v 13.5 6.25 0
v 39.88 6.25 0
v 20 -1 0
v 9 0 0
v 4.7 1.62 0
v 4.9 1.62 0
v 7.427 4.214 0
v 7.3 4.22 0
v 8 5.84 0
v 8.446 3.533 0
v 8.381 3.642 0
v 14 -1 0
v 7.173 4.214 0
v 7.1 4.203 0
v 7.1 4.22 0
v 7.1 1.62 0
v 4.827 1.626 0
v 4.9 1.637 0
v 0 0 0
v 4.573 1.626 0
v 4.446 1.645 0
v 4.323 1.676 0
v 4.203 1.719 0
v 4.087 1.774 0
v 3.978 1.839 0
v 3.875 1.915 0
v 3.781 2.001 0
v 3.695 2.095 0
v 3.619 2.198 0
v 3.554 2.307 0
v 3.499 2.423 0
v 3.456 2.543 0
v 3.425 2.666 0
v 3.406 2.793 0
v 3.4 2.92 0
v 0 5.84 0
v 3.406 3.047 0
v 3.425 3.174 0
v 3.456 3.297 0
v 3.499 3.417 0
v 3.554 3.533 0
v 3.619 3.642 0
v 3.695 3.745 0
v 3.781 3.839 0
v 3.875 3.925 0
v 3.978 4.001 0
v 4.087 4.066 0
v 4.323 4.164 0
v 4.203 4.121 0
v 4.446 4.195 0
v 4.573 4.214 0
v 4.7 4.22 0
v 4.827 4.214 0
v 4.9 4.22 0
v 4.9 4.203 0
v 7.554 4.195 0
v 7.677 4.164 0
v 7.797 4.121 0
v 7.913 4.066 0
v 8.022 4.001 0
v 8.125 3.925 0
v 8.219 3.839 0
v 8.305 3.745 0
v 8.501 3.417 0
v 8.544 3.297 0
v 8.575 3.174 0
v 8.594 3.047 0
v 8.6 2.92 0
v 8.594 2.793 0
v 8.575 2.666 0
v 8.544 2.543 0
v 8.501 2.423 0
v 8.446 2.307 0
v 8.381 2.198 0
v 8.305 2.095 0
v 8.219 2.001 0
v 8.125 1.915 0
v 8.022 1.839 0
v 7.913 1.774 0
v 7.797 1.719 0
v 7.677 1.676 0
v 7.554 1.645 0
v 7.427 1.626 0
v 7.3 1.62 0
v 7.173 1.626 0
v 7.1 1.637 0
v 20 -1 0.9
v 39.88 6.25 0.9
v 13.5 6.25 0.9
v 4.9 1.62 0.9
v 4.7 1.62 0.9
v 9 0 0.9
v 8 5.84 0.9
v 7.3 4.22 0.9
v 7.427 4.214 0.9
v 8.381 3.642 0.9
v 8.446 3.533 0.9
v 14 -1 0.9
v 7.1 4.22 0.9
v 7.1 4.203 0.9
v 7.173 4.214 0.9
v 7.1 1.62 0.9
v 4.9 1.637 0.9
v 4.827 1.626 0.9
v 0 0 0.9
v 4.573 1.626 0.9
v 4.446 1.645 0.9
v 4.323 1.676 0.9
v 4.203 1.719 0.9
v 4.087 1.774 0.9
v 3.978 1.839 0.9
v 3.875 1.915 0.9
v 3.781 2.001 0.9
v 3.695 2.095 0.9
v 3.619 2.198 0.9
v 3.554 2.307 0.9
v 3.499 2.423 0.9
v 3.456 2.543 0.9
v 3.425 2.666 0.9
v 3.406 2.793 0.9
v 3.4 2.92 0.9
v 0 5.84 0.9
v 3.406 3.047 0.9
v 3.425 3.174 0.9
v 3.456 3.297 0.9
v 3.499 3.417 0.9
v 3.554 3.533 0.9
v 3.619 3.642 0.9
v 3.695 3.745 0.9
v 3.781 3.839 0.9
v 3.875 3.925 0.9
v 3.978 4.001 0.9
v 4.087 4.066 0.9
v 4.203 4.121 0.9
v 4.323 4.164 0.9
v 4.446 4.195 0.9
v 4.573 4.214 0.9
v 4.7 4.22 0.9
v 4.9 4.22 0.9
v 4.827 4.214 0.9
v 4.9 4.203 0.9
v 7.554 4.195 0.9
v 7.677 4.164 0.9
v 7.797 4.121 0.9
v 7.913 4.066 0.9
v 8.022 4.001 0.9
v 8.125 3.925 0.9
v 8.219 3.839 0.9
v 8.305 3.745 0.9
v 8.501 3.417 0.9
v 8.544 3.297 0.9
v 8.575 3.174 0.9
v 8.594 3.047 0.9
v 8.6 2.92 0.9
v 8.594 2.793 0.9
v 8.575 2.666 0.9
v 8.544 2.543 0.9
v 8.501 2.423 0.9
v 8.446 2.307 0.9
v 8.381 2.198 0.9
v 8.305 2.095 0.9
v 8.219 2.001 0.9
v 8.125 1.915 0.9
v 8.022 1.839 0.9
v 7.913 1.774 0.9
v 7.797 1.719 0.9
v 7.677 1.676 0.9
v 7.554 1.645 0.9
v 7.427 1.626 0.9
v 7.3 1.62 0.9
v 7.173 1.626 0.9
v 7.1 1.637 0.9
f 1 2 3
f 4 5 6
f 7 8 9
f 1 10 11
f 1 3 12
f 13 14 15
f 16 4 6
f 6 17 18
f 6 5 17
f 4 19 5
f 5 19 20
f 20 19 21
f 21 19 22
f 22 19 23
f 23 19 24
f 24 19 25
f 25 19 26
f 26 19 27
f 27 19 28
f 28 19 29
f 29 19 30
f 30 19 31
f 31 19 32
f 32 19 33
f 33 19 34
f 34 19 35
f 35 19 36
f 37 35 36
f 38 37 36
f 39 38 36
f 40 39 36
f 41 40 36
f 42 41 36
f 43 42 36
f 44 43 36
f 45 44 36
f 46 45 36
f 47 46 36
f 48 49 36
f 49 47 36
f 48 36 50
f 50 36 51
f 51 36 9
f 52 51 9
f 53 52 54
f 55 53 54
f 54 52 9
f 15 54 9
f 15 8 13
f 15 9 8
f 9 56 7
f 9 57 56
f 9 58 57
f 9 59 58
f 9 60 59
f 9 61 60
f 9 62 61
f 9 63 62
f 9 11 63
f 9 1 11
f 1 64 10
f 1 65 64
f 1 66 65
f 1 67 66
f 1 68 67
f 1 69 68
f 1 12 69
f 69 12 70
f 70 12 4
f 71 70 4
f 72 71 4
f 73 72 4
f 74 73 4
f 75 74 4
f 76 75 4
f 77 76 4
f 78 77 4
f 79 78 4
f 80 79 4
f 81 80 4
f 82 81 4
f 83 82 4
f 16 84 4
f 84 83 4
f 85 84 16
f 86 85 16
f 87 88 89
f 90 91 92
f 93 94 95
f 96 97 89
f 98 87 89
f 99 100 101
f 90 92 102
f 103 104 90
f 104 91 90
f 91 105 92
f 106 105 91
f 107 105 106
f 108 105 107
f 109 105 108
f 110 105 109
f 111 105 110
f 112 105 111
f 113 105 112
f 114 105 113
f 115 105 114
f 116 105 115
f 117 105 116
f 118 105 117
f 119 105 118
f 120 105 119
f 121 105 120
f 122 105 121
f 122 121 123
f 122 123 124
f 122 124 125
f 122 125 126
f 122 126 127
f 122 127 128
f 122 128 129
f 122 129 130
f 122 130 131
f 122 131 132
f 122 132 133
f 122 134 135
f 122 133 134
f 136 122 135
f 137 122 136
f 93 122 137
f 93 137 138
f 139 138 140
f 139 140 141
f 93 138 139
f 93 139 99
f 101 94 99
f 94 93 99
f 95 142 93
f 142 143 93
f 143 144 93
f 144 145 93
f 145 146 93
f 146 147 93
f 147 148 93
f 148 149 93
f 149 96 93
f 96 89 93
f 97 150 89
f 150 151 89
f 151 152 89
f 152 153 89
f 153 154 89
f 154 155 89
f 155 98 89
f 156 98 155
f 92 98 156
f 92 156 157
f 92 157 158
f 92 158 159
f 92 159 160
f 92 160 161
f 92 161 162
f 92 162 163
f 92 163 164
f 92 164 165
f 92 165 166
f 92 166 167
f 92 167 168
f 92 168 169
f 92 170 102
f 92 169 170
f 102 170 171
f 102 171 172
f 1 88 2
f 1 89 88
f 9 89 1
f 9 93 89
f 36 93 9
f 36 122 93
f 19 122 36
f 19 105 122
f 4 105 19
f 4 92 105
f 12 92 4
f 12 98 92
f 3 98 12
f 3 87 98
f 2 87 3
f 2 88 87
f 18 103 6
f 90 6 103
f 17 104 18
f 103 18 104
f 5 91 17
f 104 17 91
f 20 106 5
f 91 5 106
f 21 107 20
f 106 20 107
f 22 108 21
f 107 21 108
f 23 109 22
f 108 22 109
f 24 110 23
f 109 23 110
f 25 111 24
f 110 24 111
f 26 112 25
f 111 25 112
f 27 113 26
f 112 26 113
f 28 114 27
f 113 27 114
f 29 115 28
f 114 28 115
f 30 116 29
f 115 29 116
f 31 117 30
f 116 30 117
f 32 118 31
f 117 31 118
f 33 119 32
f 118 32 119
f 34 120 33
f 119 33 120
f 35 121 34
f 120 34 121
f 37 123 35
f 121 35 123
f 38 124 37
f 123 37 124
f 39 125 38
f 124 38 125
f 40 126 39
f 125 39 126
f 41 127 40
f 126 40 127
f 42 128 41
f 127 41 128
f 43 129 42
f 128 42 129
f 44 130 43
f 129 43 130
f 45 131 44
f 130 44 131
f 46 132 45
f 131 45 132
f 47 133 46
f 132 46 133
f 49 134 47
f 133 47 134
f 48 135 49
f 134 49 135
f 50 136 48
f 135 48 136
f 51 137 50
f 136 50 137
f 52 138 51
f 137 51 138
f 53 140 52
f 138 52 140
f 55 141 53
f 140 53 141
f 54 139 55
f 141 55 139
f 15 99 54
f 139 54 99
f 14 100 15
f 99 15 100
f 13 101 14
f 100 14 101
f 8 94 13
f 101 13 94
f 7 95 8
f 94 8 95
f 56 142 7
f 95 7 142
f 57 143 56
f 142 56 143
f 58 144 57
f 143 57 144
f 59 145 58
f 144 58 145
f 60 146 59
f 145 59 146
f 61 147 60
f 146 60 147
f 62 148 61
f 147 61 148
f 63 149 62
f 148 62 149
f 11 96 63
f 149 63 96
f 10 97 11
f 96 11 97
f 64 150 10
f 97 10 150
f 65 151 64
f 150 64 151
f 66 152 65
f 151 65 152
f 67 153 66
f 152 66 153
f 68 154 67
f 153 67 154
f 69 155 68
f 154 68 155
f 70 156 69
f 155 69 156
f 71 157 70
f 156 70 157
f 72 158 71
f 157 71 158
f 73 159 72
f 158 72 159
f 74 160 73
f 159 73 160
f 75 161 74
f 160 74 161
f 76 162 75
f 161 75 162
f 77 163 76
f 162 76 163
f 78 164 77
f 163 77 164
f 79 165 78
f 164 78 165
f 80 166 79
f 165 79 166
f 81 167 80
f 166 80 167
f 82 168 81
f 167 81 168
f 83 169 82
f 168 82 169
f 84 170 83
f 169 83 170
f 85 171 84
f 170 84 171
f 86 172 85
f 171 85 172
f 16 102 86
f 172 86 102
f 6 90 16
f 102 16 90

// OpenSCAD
// WORK IN PROGRESS CHECK BACK LATER

gasket_outer_diameter = 30;
gasket_material_thickness = 2;

blade_type = "11"; // currently only option is an 11 blade

function eleven_blade_profile() =
  [
    [0.0, 0.0],
    [0.0, 5.84],
    [8.0, 5.84],
    [13.5, 6.25],
    [39.88, 6.25],
    [20.0, -1.0],
    [14.0, -1.0],
    [9.0, 0.0],
  ];

linear_extrude(height=0.45 * 2)
  difference() {
    polygon(points=eleven_blade_profile());

    color("red")

      translate([6, 5.84 / 2, 0])
        union() {

          translate([-1.3, 0, 0]) circle(r=1.3, $fn=64);
          translate([1.3, 0, 0]) circle(r=1.3, $fn=64);
          square([2.2, 2.6], center=true);
        }
  }
